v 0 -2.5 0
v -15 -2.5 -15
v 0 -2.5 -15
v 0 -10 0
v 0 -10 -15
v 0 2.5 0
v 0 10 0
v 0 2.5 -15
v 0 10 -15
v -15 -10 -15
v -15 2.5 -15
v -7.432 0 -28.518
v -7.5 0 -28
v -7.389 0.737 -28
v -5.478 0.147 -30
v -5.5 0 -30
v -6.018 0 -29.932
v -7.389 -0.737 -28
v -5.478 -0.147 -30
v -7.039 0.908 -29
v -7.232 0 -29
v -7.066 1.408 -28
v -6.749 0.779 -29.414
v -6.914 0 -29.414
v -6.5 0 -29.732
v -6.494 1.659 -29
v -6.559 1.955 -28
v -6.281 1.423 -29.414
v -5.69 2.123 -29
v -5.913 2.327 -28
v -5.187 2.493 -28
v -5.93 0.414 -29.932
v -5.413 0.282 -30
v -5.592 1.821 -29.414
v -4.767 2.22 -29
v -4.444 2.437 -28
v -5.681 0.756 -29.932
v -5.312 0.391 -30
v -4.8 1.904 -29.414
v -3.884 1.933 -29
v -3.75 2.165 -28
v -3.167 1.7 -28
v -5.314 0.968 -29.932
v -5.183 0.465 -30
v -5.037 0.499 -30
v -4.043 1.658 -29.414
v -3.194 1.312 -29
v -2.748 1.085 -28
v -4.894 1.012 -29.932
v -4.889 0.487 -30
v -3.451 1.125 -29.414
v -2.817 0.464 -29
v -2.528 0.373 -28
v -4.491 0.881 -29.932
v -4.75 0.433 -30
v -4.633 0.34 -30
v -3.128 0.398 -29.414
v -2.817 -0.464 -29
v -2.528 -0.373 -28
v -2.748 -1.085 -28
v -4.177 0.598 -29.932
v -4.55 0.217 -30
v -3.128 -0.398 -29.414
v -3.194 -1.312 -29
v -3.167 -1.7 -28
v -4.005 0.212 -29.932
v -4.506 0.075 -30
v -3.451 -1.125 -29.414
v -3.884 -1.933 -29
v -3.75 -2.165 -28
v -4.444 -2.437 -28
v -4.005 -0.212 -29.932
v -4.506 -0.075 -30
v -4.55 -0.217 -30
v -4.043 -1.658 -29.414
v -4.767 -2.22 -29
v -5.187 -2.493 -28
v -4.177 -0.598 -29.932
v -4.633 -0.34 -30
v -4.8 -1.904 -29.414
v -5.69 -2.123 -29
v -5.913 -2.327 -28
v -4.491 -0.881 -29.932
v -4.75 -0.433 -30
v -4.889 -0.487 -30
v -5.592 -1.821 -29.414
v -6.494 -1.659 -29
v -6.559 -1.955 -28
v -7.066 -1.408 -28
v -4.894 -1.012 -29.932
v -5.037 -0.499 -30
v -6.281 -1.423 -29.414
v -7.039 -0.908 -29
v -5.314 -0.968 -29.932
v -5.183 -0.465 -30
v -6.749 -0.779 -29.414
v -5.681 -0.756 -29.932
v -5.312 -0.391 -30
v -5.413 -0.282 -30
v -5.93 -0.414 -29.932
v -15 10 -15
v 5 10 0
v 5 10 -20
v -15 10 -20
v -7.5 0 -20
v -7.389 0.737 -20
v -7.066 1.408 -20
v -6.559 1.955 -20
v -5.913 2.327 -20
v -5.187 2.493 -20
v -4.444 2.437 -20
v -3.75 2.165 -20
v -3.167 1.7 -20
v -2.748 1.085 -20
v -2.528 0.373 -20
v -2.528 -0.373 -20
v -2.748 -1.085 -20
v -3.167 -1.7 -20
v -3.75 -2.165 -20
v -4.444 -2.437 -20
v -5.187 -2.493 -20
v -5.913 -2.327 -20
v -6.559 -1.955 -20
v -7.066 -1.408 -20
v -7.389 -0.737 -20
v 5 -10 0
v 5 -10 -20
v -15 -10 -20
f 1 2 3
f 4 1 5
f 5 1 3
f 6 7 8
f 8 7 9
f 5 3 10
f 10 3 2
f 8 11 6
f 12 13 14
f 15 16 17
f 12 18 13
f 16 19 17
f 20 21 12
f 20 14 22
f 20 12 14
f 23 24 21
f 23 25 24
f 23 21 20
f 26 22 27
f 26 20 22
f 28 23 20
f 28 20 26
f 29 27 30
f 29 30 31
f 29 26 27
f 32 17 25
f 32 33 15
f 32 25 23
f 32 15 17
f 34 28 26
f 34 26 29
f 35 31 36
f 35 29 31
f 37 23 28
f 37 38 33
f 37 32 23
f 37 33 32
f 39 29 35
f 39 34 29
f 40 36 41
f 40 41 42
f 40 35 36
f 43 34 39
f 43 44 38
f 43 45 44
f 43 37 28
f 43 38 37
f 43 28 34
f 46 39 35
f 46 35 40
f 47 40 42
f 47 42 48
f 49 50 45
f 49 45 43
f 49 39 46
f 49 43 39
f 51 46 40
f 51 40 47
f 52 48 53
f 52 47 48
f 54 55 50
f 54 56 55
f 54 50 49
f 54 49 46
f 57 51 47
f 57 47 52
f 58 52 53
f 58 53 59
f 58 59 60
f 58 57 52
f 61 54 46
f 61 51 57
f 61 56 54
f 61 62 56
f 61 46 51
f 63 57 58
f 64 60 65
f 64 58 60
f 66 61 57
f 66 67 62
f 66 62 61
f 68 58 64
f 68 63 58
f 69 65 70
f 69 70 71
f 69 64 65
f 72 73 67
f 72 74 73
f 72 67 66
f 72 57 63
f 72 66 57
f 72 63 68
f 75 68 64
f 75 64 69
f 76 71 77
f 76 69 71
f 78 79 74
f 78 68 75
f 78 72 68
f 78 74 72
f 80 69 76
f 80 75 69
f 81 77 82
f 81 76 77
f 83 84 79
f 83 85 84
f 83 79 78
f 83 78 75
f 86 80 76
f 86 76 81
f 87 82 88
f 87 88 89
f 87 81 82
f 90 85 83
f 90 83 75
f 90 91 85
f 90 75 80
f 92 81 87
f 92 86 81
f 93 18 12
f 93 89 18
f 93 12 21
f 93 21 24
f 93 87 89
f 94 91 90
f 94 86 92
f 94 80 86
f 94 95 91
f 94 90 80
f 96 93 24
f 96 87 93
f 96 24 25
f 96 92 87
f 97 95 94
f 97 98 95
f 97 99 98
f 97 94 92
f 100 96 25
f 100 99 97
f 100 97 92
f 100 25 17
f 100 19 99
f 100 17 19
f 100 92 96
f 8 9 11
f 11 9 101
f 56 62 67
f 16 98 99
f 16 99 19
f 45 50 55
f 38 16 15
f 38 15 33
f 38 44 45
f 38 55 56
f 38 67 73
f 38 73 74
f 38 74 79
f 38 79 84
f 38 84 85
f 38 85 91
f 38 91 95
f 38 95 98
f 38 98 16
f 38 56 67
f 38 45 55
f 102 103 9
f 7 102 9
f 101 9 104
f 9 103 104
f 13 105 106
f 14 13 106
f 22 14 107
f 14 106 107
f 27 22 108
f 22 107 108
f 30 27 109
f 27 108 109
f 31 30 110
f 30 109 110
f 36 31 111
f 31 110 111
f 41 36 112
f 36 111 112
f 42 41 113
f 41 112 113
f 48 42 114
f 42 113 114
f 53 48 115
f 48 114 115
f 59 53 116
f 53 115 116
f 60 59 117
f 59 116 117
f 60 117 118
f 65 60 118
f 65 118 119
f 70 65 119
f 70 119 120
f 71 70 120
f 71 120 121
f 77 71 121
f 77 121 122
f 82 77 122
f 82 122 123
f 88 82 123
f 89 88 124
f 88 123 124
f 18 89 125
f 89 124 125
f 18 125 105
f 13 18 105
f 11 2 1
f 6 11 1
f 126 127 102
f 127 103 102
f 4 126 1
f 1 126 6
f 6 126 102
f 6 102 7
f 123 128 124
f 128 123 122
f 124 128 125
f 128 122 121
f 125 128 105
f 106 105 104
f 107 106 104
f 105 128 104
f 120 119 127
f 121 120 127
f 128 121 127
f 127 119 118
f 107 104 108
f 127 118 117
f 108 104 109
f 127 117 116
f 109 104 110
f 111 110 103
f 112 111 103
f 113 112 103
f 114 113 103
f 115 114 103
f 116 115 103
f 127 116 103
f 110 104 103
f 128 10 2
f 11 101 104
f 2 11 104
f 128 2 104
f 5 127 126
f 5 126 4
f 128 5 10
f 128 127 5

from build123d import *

# Parameters (mm, degrees)
BOSS_EXTRUDE1_DEPTH = 10
SKETCH3_R           = 2.5
BOSS_EXTRUDE2_DEPTH = 10
FILLET1_R           = 2
RIB14_REACH         = 37
SKETCH5_WALL_W      = 93.213203436
SKETCH5_WALL_H      = 5


with BuildPart() as part:
    # Sketch2 → Boss-Extrude1 (new, symmetric)
    with BuildSketch(Plane(origin=(0, 0, 0), x_dir=(1, 0, 0), z_dir=(0, 1, 0))):
        Polygon((0, 15), (-15, 15), (-15, 20), (5, 20), (5, 0), (0, 0), align=None)
    extrude(amount=BOSS_EXTRUDE1_DEPTH, both=True)

    # Sketch3 → Boss-Extrude2 (add)
    with BuildSketch(Plane(origin=(0, 0, -20), x_dir=(-1, 0, 0), z_dir=(0, 0, -1))):
        with Locations((5, 0)):
            Circle(SKETCH3_R)
    extrude(amount=BOSS_EXTRUDE2_DEPTH)

    # Fillet1
    fillet1_edges = [part.edges().sort_by_distance(p)[0] for p in [
        (-2.5, 0, -30),
    ]]
    fillet(fillet1_edges, radius=FILLET1_R)

    # Sketch5 wall → Rib14 (add, up to next)
    with BuildSketch(Plane(origin=(-7.5, 0, -7.5), x_dir=(0.707106781187, 0, 0.707106781187), z_dir=(0.707106781187, 0, -0.707106781187)), mode=Mode.PRIVATE) as rib14_sk1:
        Rectangle(SKETCH5_WALL_W, SKETCH5_WALL_H)
    rib14_tool1 = extrude(rib14_sk1.sketch, amount=RIB14_REACH, mode=Mode.PRIVATE) - part.part
    add(rib14_tool1.solids().sort_by_distance((-7.5, 0, -7.5))[0])


solid = part.part
